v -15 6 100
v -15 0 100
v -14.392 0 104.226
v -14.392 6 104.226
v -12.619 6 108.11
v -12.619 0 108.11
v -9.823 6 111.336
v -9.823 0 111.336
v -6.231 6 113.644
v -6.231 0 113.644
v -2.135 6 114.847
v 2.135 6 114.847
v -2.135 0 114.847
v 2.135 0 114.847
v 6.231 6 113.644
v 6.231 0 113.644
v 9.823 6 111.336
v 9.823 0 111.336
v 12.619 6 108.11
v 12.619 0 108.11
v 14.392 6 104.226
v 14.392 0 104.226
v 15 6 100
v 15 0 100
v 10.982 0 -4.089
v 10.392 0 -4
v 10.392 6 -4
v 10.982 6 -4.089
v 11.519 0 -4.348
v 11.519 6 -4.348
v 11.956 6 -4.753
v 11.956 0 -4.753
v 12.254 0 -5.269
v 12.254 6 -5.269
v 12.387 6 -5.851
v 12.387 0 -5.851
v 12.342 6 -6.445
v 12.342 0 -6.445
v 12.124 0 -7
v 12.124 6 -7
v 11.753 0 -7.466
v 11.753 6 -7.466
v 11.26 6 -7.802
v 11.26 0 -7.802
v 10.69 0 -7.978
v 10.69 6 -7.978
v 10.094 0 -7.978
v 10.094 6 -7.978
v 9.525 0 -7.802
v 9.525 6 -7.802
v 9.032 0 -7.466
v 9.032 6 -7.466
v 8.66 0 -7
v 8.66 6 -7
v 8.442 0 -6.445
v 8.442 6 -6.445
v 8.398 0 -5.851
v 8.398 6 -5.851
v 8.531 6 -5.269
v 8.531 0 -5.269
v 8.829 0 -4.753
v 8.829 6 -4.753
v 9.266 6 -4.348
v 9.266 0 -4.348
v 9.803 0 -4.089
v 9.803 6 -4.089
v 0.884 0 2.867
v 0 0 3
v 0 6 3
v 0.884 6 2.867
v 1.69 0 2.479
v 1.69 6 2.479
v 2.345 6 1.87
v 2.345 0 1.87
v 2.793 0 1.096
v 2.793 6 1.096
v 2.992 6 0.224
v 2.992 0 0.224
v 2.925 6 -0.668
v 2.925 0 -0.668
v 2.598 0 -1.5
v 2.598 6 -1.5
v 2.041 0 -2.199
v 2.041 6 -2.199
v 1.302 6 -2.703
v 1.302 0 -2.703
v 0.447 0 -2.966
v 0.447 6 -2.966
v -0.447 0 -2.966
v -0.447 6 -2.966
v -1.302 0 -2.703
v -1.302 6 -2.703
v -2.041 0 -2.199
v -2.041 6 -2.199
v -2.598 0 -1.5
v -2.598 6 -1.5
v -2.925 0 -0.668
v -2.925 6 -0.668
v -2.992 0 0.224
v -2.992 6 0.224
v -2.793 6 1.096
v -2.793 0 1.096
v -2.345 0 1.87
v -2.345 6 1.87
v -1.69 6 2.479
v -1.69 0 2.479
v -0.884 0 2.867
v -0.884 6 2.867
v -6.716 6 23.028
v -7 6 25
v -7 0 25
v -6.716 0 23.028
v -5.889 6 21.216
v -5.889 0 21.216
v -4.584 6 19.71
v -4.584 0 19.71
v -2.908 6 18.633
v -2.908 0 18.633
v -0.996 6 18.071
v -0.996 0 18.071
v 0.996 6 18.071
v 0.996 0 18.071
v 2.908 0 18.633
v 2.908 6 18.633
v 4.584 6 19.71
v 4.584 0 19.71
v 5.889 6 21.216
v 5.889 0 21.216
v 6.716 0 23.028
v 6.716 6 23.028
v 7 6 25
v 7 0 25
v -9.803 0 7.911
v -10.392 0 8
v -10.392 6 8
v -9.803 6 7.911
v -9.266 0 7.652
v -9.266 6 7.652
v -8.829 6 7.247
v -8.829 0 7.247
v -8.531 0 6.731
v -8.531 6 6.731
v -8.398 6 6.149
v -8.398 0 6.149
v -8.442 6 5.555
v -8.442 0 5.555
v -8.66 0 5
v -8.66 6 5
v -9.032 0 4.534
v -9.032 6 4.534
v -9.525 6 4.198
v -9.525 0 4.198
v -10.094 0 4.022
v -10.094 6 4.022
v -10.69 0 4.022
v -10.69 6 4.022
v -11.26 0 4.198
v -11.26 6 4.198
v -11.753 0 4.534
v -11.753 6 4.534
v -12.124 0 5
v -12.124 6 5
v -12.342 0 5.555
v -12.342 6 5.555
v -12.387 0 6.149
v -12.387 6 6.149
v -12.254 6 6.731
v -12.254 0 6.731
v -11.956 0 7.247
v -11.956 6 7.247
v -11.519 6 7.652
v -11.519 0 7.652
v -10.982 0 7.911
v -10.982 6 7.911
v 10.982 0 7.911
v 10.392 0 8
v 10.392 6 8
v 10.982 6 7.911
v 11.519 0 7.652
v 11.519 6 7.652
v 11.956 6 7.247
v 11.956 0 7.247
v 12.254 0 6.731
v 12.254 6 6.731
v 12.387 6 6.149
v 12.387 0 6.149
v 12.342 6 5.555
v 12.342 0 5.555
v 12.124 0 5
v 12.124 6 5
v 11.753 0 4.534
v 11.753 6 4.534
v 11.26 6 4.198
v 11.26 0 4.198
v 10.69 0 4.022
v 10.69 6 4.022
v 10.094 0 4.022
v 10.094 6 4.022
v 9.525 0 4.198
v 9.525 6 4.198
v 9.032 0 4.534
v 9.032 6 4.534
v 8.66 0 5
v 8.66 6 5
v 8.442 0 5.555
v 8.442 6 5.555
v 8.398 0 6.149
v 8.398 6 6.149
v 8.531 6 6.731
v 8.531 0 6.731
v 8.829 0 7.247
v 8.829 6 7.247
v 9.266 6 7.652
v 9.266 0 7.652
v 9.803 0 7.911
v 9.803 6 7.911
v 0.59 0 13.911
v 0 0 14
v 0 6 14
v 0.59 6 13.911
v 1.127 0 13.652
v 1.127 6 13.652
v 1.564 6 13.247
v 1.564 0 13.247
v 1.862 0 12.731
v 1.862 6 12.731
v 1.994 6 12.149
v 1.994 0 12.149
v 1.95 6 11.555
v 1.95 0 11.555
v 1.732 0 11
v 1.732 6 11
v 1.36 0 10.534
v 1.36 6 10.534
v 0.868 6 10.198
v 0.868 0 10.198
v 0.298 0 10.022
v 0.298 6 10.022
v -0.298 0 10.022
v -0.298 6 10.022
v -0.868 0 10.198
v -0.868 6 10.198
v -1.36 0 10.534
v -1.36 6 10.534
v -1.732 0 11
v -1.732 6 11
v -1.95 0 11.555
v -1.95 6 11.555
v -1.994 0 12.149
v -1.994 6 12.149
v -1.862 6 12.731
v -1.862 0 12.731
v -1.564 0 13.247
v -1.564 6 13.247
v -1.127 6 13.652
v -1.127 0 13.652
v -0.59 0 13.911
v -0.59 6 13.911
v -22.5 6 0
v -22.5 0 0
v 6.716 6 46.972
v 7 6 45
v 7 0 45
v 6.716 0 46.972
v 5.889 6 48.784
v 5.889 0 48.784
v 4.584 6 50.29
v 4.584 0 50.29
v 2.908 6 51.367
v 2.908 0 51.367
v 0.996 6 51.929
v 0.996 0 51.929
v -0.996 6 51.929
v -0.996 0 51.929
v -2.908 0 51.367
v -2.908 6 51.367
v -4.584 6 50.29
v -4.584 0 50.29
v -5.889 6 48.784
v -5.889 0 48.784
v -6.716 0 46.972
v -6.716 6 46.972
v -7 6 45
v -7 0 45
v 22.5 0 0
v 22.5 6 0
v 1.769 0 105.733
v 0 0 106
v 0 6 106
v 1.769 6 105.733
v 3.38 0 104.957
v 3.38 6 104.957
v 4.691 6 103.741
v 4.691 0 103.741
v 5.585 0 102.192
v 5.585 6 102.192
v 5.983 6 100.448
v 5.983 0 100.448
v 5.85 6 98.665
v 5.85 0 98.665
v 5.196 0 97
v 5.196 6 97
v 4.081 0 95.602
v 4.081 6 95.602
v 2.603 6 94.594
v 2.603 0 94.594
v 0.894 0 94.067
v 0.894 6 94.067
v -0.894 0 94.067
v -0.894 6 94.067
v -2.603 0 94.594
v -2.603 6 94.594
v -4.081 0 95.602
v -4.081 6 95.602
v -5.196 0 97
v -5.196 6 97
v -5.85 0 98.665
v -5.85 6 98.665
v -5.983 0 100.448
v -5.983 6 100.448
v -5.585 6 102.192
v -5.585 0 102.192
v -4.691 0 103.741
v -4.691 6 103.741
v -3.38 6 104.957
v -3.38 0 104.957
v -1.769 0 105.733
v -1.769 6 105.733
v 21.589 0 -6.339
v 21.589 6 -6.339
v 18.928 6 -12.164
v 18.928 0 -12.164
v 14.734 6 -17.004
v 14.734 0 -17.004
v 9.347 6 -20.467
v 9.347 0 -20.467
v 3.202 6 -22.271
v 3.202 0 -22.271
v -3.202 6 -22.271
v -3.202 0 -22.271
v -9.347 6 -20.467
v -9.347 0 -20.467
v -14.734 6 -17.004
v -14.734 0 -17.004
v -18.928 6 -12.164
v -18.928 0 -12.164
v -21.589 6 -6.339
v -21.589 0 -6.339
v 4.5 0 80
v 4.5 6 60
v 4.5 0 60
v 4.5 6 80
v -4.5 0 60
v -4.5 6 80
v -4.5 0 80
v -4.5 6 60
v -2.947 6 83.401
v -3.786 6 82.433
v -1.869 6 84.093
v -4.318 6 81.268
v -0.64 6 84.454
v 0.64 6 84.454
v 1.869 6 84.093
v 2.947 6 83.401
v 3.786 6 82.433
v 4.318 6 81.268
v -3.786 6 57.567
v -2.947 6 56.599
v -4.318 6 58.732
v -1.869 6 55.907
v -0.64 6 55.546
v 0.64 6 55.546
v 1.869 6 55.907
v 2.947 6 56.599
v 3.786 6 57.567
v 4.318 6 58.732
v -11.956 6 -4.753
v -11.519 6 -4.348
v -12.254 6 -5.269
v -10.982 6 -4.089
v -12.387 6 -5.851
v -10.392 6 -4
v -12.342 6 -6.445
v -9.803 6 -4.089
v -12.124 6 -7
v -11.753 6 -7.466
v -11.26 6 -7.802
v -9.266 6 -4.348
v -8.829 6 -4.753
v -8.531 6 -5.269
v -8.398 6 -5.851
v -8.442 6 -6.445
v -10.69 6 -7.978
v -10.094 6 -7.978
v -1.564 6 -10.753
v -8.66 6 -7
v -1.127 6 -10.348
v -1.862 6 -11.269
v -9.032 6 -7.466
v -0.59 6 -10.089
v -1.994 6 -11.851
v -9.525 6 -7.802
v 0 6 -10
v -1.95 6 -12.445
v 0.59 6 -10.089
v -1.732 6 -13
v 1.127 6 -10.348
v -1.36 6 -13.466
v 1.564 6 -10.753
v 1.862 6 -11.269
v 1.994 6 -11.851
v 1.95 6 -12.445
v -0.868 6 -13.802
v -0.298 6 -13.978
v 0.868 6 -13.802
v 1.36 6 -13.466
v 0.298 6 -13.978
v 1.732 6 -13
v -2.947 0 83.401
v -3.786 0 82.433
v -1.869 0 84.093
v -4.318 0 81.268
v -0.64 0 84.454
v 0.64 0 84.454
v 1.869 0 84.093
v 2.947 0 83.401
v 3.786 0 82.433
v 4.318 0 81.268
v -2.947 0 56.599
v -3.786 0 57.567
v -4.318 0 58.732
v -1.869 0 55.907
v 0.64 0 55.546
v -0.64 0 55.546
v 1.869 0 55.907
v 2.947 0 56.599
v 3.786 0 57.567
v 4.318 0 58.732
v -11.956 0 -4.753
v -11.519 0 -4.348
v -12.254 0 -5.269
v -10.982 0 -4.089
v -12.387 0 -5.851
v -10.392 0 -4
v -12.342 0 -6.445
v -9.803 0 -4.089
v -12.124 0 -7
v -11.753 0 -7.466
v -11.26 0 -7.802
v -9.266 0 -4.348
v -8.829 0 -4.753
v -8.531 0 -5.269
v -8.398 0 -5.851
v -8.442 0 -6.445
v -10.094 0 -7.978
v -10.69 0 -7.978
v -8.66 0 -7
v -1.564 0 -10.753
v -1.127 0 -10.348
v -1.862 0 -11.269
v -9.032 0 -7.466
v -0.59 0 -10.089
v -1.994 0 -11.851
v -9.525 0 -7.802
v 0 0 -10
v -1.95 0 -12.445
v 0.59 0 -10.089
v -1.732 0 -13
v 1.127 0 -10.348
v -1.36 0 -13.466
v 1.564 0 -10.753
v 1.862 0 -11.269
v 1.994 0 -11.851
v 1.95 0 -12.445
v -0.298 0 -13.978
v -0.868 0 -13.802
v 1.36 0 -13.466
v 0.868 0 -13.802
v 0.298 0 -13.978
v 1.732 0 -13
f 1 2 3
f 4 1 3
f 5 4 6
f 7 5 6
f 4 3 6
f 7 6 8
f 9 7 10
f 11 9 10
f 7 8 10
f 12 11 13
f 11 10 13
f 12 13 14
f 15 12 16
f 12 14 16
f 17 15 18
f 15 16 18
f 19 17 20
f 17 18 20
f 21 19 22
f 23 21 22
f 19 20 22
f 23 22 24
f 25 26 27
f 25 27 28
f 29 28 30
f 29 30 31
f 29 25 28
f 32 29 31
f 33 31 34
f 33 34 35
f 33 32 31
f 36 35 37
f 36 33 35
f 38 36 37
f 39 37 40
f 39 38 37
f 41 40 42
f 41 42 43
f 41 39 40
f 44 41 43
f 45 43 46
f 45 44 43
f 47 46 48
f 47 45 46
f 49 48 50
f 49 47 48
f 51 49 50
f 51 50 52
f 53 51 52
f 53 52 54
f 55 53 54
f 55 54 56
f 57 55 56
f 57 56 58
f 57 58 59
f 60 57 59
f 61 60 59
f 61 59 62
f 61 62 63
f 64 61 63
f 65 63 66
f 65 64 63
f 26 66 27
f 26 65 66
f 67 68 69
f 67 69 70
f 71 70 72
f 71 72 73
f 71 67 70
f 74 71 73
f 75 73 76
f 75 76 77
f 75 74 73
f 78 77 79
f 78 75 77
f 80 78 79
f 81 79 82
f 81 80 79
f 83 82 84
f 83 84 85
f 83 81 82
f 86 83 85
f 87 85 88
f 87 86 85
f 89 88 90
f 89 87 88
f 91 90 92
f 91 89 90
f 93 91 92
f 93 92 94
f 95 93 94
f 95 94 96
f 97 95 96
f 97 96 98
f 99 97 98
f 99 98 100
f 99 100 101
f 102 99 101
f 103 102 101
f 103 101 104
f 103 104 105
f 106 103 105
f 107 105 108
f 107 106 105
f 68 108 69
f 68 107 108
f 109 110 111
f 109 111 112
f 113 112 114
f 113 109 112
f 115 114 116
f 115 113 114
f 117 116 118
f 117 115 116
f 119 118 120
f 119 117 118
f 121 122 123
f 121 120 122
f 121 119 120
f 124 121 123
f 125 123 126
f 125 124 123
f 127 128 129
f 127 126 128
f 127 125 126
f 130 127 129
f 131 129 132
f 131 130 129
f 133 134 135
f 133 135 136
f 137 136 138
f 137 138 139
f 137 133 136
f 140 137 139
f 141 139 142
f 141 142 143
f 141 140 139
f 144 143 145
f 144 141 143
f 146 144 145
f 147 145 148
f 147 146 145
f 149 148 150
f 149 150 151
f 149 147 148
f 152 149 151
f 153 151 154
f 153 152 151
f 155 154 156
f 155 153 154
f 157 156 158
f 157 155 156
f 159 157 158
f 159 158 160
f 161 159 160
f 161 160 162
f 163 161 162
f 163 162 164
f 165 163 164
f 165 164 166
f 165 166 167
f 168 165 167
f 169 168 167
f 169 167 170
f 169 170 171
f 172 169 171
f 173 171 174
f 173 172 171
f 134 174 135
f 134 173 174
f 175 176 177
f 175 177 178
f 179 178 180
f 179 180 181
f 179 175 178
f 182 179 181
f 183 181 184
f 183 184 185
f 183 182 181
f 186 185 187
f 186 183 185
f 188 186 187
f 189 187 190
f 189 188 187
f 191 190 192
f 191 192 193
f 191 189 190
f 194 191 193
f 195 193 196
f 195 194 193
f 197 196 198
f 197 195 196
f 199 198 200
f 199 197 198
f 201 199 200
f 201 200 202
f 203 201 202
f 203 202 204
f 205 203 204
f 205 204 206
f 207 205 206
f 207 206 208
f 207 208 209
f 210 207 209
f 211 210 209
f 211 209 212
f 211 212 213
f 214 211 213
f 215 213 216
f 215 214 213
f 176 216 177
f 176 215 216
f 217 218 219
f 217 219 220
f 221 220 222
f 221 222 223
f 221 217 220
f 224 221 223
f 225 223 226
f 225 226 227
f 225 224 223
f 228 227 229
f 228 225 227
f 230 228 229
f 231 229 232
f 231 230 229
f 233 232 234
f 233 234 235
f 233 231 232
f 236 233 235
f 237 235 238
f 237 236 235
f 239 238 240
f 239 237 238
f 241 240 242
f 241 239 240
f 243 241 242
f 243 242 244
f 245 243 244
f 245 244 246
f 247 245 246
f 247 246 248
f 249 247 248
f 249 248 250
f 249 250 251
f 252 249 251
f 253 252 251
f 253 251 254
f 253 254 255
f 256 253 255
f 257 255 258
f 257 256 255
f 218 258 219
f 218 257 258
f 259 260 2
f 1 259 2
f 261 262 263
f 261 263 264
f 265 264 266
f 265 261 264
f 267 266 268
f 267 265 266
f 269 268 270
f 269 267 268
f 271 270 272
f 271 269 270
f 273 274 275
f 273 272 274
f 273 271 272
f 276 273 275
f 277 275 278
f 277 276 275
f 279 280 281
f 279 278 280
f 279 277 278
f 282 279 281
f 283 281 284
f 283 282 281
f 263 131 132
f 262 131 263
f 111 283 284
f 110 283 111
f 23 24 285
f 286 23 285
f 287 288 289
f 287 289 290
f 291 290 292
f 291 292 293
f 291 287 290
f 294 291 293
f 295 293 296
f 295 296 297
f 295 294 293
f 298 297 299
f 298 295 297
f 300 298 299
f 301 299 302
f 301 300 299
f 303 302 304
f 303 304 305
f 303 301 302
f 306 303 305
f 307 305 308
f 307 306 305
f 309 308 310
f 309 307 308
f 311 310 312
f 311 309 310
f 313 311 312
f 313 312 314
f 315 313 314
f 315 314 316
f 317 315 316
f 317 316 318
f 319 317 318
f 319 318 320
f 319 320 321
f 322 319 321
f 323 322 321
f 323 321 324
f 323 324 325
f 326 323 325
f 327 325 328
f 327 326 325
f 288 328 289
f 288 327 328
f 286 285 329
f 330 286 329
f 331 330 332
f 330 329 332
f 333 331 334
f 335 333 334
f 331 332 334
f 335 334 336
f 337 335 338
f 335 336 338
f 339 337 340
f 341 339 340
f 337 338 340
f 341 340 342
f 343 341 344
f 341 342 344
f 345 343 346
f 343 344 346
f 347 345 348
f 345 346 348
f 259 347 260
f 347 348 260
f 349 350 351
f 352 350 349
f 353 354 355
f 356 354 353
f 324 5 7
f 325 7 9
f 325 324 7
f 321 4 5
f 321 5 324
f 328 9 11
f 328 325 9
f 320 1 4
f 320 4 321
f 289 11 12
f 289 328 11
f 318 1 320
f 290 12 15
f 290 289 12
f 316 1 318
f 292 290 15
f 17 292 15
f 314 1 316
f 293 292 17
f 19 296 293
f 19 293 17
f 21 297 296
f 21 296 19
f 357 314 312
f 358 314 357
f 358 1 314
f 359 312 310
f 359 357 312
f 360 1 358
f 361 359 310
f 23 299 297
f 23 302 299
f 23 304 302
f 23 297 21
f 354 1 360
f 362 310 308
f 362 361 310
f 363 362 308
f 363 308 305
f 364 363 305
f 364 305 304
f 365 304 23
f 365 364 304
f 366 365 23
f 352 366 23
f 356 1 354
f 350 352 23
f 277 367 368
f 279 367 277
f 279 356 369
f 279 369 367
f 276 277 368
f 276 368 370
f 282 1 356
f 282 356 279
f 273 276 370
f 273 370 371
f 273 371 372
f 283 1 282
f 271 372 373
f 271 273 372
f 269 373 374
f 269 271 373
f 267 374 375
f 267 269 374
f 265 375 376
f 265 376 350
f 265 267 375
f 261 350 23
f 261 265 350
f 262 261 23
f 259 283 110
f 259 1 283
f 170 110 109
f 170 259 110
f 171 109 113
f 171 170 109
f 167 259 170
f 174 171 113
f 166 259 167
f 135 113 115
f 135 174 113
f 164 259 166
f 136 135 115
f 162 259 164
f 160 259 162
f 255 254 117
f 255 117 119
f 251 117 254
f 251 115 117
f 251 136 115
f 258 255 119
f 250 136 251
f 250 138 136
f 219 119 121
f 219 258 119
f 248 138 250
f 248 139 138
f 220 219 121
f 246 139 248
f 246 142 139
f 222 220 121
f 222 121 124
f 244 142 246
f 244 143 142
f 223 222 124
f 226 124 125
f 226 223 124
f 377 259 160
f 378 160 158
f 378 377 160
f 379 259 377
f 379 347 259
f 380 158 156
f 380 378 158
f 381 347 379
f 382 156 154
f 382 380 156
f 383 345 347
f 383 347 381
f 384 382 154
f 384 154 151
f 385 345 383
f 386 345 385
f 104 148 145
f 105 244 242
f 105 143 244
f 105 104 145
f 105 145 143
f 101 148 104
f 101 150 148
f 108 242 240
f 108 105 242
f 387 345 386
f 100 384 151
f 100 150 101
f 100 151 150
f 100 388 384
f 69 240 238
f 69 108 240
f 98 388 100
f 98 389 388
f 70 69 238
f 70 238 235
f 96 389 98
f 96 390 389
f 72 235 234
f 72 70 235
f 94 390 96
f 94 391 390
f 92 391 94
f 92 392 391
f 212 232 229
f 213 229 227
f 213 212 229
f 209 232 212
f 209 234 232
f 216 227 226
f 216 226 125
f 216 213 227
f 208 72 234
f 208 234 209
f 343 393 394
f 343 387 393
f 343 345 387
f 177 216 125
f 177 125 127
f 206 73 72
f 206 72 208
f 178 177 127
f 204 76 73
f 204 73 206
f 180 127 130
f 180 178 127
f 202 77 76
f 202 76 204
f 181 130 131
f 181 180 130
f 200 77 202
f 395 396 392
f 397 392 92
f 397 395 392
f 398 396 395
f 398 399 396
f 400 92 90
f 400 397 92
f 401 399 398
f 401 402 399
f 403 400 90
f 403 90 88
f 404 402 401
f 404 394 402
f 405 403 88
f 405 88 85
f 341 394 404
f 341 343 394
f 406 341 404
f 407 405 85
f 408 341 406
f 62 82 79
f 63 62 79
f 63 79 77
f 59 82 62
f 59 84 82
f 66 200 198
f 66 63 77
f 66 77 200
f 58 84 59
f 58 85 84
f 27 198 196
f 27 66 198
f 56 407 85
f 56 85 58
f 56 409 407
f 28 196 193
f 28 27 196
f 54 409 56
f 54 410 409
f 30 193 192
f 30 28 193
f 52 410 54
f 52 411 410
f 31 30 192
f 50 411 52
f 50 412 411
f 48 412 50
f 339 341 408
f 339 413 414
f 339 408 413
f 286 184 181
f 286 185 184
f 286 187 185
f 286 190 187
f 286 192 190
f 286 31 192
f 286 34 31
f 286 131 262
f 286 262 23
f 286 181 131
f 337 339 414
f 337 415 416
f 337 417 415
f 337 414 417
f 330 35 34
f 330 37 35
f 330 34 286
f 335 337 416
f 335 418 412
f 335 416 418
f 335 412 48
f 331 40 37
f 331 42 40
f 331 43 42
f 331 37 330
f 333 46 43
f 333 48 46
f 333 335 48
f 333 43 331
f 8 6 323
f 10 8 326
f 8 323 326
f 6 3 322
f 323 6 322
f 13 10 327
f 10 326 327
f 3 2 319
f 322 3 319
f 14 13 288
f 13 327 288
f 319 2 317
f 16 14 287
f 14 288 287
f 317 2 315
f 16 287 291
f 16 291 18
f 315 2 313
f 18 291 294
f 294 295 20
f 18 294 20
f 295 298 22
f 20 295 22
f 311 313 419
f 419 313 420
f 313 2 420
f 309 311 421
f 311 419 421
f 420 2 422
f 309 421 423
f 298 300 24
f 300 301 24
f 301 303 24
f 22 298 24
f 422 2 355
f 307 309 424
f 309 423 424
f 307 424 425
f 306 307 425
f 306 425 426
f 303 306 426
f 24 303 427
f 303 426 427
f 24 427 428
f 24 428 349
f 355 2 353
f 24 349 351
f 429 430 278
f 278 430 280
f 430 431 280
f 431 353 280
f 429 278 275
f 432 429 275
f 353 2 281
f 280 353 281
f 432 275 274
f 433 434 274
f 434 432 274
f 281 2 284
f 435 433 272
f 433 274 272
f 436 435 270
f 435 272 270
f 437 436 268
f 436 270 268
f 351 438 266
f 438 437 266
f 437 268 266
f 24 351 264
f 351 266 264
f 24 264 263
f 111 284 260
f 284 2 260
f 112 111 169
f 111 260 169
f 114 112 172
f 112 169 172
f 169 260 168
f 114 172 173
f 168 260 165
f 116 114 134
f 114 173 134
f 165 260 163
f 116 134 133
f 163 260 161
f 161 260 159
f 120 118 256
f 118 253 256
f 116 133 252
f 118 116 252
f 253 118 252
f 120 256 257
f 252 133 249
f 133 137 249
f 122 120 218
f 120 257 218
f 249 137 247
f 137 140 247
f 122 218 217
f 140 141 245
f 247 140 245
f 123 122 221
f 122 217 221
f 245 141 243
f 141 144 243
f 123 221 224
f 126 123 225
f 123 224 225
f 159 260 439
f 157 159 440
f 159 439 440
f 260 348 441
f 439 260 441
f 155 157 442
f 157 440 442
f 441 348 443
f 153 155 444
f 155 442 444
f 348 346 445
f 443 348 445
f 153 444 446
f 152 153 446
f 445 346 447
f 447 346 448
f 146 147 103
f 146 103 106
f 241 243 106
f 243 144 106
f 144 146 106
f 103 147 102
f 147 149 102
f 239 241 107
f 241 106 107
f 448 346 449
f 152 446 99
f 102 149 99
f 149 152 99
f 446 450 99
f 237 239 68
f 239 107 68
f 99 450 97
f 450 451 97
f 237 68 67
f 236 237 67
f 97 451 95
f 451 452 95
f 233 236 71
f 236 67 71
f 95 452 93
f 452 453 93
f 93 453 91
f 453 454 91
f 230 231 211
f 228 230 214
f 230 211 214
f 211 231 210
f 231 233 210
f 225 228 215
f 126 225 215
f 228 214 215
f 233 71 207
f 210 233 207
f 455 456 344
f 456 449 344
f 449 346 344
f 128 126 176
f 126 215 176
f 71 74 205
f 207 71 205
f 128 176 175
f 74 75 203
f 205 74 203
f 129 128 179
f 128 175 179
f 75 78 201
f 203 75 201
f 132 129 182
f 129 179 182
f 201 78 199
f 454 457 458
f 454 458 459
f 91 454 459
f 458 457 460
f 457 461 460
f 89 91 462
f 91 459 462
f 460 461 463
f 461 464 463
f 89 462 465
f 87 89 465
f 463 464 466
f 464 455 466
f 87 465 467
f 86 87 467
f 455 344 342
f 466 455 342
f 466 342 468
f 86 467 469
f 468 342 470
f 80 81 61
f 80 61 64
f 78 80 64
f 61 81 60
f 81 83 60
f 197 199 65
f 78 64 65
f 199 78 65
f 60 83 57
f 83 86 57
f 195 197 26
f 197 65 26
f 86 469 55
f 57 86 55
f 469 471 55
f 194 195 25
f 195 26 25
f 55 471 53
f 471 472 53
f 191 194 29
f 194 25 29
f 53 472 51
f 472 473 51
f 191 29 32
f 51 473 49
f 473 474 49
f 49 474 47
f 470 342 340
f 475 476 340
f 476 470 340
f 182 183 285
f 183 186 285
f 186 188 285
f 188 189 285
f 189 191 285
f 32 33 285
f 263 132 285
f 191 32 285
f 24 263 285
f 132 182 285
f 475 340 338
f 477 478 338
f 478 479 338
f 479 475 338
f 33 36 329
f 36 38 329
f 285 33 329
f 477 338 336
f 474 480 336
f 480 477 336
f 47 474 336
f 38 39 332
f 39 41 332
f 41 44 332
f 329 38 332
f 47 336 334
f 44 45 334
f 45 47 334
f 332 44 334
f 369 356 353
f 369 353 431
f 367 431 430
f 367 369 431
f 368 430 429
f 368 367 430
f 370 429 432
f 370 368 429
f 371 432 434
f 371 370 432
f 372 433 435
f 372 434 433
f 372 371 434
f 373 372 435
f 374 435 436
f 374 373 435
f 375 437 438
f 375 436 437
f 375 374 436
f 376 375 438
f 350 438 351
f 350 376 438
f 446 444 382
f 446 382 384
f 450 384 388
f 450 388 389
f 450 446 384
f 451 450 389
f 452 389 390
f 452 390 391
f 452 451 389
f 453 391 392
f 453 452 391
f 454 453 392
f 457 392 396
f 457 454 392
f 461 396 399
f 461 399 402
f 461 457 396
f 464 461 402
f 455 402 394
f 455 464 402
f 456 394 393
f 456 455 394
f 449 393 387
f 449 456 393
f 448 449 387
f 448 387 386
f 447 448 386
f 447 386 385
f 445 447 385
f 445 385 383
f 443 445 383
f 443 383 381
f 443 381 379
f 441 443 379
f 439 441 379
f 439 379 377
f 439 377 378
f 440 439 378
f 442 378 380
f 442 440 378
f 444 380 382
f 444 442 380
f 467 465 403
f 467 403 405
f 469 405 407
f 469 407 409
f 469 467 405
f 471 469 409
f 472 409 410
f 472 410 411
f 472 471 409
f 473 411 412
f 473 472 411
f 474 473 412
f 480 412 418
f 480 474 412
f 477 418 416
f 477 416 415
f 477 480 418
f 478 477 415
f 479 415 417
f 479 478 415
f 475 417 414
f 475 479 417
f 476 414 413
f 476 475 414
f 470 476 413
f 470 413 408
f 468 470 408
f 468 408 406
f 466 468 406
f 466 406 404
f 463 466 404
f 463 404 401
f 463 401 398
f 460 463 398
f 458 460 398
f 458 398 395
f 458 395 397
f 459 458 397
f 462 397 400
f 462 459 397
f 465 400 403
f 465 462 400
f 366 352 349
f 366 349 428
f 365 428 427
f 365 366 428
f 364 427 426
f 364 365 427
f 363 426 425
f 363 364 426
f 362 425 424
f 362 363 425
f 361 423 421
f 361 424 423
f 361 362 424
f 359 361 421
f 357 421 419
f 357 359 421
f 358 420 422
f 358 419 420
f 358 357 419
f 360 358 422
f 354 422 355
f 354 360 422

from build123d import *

# Parameters (mm, degrees)
SKETCH_1_R          = 2
SKETCH_1_R_2        = 3
SKETCH_1_R_3        = 6
EXTRUDE_1_DEPTH     = 6
CUT_EXTRUDE_1_DEPTH = 10


with BuildPart() as part:
    # 草图1 → 凸台-拉伸1 (new body)
    with BuildSketch(Plane(origin=(0, 0, 0), x_dir=(1, 0, 0), z_dir=(0, 1, 0))):
        with BuildLine():
            Line((15, -100), (22.5, 0))
            ThreePointArc((22.5, 0), (0, 22.5), (-22.5, 0))
            Line((-22.5, 0), (-15, -100))
            ThreePointArc((-15, -100), (0, -115), (15, -100))
        make_face()
        with Locations(Location((0, 12, 0), (0, 0, 270))):
            Circle(SKETCH_1_R, mode=Mode.SUBTRACT)
        with Locations(Location((10.392304845, 6, 0), (0, 0, 270))):
            Circle(SKETCH_1_R, mode=Mode.SUBTRACT)
        with Locations(Location((10.392304845, -6, 0), (0, 0, 270))):
            Circle(SKETCH_1_R, mode=Mode.SUBTRACT)
        with Locations(Location((0, -12, 0), (0, 0, 270))):
            Circle(SKETCH_1_R, mode=Mode.SUBTRACT)
        with Locations(Location((-10.392304845, -6, 0), (0, 0, 270))):
            Circle(SKETCH_1_R, mode=Mode.SUBTRACT)
        with Locations(Location((-10.392304845, 6, 0), (0, 0, 270))):
            Circle(SKETCH_1_R, mode=Mode.SUBTRACT)
        with Locations(Location((0, 0, 0), (0, 0, 270))):
            Circle(SKETCH_1_R_2, mode=Mode.SUBTRACT)
        with Locations(Location((0, -100, 0), (0, 0, 270))):
            Circle(SKETCH_1_R_3, mode=Mode.SUBTRACT)
    extrude(amount=EXTRUDE_1_DEPTH)

    # 草图2 → 切除-拉伸1 (cut)
    with BuildSketch(Plane(origin=(0, 6, 0), x_dir=(1, 0, 0), z_dir=(0, 1, 0))):
        with BuildLine():
            Line((-4.5, -80), (-4.5, -60))
            ThreePointArc((-4.5, -60), (0, -55.5), (4.5, -60))
            Line((4.5, -60), (4.5, -80))
            ThreePointArc((4.5, -80), (0, -84.5), (-4.5, -80))
        make_face()
        with BuildLine():
            Line((-7, -45), (-7, -25))
            ThreePointArc((-7, -25), (0, -18), (7, -25))
            Line((7, -25), (7, -45))
            ThreePointArc((7, -45), (0, -52), (-7, -45))
        make_face()
    extrude(amount=-CUT_EXTRUDE_1_DEPTH, mode=Mode.SUBTRACT)


solid = part.part
